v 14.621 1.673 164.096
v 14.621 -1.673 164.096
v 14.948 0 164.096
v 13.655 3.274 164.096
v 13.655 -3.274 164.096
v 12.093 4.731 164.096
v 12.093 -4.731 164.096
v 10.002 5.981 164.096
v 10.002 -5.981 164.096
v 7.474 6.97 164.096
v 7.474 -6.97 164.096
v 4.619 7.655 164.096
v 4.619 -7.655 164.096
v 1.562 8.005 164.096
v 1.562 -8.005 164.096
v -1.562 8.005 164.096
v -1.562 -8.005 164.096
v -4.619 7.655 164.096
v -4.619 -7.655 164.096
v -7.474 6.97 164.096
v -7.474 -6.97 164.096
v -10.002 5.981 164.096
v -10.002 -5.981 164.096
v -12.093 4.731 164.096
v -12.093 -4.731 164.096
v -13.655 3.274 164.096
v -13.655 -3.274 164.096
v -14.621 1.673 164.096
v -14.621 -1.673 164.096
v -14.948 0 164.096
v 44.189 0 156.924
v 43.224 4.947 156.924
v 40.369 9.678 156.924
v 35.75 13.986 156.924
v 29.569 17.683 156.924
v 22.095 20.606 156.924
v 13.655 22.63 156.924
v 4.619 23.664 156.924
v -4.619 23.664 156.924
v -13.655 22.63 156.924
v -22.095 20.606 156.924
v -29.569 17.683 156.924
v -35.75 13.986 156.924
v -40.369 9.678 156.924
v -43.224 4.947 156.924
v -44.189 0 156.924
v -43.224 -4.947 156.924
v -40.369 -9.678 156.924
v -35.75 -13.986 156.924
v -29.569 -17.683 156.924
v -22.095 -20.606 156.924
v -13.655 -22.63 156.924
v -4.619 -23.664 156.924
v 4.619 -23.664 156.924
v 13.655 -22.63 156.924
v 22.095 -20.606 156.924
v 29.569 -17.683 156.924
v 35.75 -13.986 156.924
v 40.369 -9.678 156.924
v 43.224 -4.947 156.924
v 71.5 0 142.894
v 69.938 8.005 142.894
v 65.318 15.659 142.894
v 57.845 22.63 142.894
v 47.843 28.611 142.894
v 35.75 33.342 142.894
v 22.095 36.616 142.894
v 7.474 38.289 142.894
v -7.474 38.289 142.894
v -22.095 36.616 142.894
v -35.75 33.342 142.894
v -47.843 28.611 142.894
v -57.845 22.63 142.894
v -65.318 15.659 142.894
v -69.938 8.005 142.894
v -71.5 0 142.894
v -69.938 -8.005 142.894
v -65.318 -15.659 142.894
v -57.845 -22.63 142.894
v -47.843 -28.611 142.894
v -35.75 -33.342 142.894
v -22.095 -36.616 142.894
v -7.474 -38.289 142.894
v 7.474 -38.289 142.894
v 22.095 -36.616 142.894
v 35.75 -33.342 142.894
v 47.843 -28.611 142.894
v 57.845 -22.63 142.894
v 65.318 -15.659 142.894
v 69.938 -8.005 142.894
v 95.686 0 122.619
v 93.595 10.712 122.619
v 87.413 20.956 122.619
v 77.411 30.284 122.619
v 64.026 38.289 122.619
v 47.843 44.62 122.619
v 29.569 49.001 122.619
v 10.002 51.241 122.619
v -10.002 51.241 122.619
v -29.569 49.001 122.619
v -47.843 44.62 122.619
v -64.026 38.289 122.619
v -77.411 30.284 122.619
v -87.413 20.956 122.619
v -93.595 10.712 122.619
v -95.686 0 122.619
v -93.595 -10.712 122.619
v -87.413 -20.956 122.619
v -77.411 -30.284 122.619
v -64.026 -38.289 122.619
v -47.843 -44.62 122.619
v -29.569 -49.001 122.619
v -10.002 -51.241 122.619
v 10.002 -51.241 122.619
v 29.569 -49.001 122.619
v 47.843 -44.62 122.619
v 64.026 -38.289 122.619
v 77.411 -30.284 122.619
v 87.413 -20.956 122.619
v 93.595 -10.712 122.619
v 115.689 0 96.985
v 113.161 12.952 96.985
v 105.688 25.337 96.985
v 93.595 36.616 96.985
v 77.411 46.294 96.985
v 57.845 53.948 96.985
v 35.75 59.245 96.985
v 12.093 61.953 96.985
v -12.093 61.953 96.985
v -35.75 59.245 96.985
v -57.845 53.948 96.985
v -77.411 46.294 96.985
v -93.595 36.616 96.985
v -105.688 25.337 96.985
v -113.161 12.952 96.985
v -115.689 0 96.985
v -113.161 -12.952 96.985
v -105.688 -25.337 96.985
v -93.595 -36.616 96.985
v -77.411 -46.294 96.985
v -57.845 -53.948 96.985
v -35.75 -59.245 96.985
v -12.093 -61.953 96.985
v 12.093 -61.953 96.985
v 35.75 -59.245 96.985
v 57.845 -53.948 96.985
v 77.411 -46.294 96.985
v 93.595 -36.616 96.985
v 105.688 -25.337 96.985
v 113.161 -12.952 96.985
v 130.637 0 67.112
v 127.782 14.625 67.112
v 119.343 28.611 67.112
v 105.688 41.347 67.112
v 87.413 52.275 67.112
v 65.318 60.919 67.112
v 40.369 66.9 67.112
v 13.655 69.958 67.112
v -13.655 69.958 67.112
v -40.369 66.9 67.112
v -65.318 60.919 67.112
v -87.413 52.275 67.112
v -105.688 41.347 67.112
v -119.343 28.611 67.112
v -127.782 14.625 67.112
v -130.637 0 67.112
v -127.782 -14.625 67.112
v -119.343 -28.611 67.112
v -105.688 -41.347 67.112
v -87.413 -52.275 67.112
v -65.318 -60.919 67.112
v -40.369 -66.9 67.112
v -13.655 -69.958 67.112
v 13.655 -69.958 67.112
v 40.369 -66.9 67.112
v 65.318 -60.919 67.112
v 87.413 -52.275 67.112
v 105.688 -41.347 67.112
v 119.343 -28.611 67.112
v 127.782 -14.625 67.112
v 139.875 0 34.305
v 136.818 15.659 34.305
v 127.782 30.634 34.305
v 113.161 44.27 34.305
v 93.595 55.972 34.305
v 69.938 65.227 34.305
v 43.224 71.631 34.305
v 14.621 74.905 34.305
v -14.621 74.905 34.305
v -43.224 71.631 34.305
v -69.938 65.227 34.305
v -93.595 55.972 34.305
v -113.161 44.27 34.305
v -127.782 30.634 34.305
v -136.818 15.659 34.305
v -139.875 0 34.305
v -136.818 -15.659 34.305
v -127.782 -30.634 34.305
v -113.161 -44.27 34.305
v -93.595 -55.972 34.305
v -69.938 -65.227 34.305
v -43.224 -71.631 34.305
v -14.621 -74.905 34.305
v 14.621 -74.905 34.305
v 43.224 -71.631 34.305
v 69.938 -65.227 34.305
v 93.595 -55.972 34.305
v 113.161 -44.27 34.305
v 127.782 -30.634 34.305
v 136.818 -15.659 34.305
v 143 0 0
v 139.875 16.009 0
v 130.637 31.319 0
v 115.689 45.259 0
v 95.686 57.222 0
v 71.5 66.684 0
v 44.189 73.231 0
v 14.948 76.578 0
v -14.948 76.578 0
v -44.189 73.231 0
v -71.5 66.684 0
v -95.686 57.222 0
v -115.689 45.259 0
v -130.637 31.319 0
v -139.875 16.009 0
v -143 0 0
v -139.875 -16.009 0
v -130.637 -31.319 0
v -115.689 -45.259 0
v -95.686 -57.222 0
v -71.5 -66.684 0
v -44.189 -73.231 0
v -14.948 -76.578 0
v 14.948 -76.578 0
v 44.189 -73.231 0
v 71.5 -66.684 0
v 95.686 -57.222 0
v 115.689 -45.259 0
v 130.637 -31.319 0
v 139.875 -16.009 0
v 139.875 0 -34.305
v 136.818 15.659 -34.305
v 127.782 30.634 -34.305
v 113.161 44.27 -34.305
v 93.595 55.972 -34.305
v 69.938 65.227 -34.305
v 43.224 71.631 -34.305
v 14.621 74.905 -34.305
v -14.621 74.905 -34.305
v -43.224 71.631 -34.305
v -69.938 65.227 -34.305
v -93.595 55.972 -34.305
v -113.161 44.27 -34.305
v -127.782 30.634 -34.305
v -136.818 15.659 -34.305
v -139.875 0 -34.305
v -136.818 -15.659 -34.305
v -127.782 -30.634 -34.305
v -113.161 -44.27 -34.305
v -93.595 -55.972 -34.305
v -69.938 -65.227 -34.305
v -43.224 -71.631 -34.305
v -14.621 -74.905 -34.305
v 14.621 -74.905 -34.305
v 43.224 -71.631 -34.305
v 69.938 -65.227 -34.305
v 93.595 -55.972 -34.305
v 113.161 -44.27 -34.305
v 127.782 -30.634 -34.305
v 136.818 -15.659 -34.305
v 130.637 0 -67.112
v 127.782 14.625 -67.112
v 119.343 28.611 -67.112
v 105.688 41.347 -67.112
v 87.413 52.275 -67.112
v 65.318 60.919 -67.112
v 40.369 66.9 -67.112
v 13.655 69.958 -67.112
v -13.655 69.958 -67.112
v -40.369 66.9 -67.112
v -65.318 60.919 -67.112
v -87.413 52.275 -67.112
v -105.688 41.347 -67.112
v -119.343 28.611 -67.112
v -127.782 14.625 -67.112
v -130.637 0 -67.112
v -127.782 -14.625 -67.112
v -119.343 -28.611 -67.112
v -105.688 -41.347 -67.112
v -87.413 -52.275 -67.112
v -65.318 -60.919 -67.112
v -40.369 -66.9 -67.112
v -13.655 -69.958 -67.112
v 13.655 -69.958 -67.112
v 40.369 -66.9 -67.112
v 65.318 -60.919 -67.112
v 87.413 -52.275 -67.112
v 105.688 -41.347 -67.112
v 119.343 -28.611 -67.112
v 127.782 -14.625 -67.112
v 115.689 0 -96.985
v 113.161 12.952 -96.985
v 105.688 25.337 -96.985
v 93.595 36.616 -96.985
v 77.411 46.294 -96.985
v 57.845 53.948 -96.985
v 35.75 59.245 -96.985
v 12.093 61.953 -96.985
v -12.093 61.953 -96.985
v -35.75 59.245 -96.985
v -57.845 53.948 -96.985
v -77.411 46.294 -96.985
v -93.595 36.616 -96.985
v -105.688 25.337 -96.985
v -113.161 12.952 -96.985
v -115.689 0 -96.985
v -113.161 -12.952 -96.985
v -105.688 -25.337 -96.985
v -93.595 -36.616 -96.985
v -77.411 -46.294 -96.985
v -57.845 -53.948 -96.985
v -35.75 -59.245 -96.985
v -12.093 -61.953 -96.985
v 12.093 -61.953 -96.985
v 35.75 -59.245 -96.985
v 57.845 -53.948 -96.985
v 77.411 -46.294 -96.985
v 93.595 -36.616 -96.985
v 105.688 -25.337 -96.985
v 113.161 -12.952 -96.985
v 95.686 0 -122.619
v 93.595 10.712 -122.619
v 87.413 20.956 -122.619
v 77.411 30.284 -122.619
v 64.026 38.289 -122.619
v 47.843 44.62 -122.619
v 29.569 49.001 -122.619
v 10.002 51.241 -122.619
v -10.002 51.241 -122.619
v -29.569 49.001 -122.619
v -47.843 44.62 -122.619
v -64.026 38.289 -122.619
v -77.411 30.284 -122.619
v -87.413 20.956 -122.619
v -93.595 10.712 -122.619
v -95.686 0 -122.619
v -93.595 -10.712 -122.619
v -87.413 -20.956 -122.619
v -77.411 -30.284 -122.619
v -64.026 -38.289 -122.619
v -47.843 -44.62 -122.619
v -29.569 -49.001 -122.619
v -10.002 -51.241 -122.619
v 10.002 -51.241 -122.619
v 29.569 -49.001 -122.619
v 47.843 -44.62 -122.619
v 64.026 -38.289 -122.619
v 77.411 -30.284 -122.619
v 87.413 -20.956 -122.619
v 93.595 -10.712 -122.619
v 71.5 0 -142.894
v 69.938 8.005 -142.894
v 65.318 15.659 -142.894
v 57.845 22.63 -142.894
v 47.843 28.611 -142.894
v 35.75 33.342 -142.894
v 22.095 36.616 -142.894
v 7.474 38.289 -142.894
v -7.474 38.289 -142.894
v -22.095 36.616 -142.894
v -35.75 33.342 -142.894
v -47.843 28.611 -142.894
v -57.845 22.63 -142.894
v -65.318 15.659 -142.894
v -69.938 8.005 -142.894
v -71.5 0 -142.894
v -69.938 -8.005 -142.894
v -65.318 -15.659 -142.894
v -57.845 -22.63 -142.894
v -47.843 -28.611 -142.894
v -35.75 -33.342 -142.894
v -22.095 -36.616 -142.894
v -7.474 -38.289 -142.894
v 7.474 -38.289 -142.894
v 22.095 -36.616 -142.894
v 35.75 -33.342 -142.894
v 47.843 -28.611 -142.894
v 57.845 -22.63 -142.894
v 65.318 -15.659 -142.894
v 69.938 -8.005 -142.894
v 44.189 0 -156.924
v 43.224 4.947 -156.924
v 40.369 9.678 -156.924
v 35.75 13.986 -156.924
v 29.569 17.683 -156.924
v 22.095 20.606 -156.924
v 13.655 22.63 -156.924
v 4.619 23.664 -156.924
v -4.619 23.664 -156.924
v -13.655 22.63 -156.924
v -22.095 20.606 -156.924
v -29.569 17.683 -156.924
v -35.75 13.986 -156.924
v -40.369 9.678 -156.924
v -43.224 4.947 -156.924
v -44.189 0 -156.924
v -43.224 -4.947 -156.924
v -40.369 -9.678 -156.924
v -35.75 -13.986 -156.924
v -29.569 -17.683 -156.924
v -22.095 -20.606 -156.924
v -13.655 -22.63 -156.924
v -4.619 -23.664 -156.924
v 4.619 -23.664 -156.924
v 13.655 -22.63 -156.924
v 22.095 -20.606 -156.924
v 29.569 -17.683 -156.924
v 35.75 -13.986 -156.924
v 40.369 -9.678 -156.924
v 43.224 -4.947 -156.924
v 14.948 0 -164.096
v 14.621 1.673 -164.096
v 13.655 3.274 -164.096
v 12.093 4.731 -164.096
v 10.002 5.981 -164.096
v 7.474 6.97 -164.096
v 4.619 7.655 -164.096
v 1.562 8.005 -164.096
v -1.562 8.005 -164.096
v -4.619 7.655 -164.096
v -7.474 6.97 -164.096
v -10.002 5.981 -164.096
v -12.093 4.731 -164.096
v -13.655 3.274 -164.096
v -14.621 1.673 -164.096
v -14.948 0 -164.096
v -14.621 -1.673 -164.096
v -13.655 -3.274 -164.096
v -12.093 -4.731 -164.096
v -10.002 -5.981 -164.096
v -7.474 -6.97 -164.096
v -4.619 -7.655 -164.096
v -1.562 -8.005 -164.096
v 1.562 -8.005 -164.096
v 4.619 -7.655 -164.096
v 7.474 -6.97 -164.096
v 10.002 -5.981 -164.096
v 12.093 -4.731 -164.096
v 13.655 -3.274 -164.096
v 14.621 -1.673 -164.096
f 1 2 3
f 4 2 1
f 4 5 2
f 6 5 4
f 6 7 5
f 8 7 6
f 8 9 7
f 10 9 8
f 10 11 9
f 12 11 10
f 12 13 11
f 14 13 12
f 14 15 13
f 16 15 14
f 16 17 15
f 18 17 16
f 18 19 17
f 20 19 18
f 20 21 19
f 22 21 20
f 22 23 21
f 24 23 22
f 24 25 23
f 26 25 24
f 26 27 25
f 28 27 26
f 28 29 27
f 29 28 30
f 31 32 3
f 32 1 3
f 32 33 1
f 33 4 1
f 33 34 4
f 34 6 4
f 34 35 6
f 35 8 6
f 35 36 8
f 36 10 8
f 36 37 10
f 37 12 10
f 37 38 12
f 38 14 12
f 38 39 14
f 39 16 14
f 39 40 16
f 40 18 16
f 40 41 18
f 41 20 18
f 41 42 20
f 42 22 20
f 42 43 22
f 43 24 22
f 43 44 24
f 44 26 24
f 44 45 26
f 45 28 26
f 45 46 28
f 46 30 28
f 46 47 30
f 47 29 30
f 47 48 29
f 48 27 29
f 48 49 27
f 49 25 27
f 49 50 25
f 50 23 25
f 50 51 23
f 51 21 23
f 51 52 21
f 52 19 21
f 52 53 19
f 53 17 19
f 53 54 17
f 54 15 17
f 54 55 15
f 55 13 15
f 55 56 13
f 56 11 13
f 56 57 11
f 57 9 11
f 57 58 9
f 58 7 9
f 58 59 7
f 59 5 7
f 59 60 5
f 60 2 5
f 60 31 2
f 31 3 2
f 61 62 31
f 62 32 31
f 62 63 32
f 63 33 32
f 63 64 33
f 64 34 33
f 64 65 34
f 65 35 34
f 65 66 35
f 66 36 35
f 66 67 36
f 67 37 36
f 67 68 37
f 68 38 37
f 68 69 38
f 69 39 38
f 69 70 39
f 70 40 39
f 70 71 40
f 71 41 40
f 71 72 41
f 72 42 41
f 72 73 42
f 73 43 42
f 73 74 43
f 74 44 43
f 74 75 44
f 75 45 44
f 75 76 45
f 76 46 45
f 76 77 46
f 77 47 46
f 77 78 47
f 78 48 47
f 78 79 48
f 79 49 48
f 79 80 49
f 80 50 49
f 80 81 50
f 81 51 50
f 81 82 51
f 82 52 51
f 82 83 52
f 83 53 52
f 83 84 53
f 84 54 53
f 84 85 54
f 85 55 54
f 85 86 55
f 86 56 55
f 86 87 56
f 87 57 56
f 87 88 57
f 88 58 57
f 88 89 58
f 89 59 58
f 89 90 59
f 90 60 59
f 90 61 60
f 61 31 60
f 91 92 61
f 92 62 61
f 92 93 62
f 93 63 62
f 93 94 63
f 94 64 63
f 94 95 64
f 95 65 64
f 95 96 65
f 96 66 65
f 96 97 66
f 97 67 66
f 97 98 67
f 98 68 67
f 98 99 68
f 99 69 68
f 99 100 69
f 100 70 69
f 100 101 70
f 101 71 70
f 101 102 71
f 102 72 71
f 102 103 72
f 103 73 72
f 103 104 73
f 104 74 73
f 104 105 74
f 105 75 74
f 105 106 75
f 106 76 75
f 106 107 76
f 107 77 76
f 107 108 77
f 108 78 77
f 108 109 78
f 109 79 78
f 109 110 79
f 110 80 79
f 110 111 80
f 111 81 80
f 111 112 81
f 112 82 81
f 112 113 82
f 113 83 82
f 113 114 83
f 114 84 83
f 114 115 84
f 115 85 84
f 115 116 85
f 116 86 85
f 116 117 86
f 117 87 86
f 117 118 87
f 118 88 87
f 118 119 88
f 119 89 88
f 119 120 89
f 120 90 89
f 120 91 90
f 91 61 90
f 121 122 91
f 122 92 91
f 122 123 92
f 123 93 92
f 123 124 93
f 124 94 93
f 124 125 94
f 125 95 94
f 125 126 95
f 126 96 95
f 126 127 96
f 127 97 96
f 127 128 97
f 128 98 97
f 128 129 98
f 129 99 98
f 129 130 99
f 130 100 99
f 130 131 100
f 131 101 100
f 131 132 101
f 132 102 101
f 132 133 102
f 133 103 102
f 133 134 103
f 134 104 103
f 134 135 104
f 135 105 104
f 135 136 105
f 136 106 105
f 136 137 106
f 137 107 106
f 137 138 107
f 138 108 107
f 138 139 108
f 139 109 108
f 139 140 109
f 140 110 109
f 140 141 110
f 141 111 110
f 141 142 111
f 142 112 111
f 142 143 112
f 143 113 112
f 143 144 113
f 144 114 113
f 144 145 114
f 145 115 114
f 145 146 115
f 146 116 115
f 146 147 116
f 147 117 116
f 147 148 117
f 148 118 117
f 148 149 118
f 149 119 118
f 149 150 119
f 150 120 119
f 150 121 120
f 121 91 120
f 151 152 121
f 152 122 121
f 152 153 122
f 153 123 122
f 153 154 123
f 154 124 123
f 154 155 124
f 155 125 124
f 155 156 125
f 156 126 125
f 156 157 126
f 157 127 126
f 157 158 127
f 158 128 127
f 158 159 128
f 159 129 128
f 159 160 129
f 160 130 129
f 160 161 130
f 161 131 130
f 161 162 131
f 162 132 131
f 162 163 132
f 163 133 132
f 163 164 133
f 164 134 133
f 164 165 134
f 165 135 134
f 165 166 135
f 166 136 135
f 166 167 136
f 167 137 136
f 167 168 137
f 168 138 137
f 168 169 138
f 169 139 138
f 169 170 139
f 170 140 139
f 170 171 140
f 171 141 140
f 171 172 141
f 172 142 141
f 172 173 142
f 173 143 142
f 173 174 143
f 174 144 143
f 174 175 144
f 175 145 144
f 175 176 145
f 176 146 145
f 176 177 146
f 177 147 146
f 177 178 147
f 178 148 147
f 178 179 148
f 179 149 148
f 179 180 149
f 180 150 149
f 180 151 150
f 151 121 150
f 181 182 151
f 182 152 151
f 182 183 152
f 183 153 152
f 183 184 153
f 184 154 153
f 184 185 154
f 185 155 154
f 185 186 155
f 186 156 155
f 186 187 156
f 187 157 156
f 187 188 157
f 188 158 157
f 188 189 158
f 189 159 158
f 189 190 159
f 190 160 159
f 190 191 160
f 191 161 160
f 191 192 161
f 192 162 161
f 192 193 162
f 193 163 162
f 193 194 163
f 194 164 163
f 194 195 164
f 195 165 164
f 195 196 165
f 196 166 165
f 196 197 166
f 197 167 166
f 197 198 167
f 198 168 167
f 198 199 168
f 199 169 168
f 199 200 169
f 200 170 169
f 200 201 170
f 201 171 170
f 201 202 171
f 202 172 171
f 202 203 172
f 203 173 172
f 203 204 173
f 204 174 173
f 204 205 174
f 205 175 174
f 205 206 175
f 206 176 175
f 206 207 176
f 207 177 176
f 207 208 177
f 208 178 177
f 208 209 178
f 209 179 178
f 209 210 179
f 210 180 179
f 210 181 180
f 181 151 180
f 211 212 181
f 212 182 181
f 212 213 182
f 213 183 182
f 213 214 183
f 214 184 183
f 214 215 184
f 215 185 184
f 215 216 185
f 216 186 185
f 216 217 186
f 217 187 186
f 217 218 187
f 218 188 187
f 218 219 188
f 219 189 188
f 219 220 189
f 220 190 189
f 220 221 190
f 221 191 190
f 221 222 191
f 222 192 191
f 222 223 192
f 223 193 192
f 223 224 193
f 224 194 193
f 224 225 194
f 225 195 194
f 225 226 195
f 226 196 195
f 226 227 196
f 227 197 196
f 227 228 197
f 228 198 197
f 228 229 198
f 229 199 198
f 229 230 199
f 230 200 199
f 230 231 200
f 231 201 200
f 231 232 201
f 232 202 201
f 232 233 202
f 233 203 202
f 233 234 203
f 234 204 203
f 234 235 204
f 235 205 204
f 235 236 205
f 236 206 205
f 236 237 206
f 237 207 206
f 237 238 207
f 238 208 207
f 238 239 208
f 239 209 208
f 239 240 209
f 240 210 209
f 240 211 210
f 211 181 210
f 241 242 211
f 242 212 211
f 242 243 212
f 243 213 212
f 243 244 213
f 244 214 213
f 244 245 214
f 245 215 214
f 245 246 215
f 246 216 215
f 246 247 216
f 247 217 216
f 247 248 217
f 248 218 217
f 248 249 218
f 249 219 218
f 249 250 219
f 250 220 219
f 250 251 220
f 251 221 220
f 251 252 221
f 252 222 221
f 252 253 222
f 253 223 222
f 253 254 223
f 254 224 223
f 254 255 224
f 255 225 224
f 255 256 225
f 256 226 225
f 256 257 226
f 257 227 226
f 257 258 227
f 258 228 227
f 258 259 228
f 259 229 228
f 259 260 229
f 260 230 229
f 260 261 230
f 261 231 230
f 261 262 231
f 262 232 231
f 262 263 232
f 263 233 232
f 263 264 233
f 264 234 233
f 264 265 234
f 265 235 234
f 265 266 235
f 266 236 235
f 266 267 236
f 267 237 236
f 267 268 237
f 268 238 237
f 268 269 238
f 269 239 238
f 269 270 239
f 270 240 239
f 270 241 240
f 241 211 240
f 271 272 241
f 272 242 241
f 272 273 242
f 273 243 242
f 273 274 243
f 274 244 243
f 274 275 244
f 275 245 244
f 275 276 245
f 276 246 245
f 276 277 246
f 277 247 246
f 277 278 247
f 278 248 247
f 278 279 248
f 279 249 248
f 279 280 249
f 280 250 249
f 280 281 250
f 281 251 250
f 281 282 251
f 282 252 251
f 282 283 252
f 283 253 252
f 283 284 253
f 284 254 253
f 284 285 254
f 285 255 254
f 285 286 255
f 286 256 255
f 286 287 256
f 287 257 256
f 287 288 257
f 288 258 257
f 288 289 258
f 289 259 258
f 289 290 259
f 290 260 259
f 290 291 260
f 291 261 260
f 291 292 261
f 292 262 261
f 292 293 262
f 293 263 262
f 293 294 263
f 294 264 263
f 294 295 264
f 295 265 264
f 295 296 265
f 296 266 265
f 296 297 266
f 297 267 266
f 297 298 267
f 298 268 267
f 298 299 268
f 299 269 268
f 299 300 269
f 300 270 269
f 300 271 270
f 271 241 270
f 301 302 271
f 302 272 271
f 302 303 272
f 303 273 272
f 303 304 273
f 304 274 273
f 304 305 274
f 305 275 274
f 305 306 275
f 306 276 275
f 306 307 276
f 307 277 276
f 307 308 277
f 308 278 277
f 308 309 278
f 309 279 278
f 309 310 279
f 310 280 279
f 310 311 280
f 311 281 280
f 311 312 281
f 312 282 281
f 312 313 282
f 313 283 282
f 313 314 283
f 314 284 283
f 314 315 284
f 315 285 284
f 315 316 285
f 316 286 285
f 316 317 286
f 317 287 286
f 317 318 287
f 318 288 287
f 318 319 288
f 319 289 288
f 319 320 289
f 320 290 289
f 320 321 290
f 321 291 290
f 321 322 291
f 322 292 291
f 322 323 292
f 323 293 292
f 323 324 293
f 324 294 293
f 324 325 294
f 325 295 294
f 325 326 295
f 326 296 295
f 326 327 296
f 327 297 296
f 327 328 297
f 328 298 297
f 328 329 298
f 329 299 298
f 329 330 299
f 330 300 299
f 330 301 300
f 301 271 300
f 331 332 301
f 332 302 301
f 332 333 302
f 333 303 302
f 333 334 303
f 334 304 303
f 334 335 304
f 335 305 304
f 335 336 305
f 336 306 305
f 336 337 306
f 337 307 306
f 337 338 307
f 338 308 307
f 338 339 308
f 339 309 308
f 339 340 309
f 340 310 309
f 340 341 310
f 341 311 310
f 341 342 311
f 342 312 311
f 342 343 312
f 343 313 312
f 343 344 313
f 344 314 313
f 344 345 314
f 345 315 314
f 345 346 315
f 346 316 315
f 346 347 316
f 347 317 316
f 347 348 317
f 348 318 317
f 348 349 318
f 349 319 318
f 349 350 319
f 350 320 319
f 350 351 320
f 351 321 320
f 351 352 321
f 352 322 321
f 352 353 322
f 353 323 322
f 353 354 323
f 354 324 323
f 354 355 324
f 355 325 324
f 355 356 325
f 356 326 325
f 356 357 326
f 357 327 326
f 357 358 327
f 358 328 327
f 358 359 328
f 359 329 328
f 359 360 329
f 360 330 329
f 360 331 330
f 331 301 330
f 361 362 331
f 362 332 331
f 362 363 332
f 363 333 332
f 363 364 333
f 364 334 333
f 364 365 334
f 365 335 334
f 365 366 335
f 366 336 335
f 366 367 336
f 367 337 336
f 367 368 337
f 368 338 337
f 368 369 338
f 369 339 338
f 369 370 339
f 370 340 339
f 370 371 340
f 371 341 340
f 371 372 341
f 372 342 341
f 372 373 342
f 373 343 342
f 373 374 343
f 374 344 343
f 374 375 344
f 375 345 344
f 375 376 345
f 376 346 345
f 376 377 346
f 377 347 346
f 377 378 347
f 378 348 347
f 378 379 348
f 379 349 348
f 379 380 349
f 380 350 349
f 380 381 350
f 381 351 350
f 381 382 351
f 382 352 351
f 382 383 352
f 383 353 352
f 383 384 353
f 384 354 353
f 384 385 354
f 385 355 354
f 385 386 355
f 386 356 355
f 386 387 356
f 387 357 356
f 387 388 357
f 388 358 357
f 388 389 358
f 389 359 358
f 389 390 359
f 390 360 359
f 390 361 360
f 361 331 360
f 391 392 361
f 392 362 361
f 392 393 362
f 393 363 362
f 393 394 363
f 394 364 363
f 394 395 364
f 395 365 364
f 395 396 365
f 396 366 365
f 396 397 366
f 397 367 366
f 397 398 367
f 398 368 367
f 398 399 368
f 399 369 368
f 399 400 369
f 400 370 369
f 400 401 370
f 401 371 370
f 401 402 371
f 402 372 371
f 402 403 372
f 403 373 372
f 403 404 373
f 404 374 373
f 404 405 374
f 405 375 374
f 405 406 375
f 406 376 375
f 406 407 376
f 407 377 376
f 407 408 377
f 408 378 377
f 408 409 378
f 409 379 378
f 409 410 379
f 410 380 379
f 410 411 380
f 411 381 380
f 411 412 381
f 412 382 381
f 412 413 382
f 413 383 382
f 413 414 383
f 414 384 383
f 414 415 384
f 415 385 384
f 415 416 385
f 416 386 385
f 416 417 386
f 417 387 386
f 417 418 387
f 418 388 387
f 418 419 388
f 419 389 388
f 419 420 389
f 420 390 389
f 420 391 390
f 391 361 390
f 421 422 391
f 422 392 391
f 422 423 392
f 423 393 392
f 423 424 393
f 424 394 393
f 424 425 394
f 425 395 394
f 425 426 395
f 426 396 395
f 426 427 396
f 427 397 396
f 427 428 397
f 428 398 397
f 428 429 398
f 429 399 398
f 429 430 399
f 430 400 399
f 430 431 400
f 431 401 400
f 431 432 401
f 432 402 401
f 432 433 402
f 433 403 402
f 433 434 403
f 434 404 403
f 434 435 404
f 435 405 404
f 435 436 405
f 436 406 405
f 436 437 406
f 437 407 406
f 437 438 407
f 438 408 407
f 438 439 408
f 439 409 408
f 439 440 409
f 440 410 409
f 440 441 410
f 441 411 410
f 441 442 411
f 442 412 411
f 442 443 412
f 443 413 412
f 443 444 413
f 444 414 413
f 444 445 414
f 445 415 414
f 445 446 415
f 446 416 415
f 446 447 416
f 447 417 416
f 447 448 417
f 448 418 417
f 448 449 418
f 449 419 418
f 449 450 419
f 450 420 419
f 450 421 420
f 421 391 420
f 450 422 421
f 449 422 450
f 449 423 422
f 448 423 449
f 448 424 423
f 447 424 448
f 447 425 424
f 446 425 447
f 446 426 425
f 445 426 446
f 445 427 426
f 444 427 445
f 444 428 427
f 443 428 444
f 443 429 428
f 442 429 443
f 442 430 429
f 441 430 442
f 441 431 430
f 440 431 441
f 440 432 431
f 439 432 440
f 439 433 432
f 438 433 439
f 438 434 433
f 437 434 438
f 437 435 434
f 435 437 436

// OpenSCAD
// Generated by SolidPython 1.0.1 on 2020-07-29 00:46:50


scale(v = [13, 7, 15]) {
	sphere(r = 11);
}
/***********************************************
*********      SolidPython code:      **********
************************************************
 
# import packages: SolidPython
from solid import *
from solid.utils import *
from itertools import chain, combinations, permutations


class Resize:

    def __init__(self, scad_file):
        self.scad_file = scad_file
        #self.scad_file = import_scad(scad_file)
        # cone/cylinder param:
        self.r1 = 0
        self.r2 = 0
        self.h = 0
        # rectangular prism param:
        self.w = 0
        self.l = 0
        # ellipse param:
        self.r = 0

    # import OpenScad code (file name corresponds to shape)


    # classify shape + parameters
    def assign(self, param1, param2, param3):
        if self.scad_file == 'cone.scad':
            self.r1 = param1
            self.r2 = param2
            self.h = param3
        elif self.scad_file == 'cylinder.scad':
            self.r1 = param1
            self.r2 = param2
            self.h = param3
        elif self.scad_file == 'rectangularPrism.scad':
            self.h = param1
            self.l = param2
            self.w = param3
        else:
            self.r = param1
            self.h = param2

    # resize parameters
    def iterate(self):
        x = range(3, 20, 2)
        i = 1
        if self.scad_file == 'cone.scad':
            tempList = list(permutations(x, 2))
            for temp in tempList:
                param1 = temp[0]
                param2 = temp[1]
                filepath = 'produced_scad_files/' + 'cone' + str(param1) + '_' + str(param2) + '_' + '.scad'
                scad_render_to_file(cylinder(h=param1, r1=param2, r2=0), filepath)

        elif self.scad_file == 'cylinder.scad':
            tempList = list(permutations(x, 3))
            for temp in tempList:
                param1 = temp[0]
                param2 = temp[1]
                filepath = 'produced_scad_files/' + 'cylinder' + str(param1) + '_' + str(param2) + '_' + '.scad'
                scad_render_to_file(cylinder(h=param1, r1=param2, r2=param2), filepath)

        elif self.scad_file == 'rectangularPrism.scad':
            tempList = list(permutations(x, 3))
            for temp in tempList:
                param1 = temp[0]
                param2 = temp[1]
                param3 = temp[2]
                filepath = 'produced_scad_files/' + 'rectangularPrism' + str(param1) + '_' + str(param2) + '_' + str(
                    param3) + '.scad'
                scad_render_to_file(cube(size=(param1, param2, param3)), filepath)

        elif self.scad_file == 'ellipse.scad':
            tempList = list(permutations(x, 4))
            for temp in tempList:
                param1 = temp[0]
                param2 = temp[1]
                param3 = temp[2]
                param4 = temp[3]
                filepath = 'produced_scad_files/' + 'ellipse' + str(param1) + '_' + str(param2) + '_' + str(param3) + '_' + str(param4) + '.scad'
                scad_render_to_file(scale([param1, param2, param3])(sphere(r=param4)), filepath)

    def render_to_scadfile(self):
        scad_render_to_file(scad, 'example.scad') 
 
************************************************/
